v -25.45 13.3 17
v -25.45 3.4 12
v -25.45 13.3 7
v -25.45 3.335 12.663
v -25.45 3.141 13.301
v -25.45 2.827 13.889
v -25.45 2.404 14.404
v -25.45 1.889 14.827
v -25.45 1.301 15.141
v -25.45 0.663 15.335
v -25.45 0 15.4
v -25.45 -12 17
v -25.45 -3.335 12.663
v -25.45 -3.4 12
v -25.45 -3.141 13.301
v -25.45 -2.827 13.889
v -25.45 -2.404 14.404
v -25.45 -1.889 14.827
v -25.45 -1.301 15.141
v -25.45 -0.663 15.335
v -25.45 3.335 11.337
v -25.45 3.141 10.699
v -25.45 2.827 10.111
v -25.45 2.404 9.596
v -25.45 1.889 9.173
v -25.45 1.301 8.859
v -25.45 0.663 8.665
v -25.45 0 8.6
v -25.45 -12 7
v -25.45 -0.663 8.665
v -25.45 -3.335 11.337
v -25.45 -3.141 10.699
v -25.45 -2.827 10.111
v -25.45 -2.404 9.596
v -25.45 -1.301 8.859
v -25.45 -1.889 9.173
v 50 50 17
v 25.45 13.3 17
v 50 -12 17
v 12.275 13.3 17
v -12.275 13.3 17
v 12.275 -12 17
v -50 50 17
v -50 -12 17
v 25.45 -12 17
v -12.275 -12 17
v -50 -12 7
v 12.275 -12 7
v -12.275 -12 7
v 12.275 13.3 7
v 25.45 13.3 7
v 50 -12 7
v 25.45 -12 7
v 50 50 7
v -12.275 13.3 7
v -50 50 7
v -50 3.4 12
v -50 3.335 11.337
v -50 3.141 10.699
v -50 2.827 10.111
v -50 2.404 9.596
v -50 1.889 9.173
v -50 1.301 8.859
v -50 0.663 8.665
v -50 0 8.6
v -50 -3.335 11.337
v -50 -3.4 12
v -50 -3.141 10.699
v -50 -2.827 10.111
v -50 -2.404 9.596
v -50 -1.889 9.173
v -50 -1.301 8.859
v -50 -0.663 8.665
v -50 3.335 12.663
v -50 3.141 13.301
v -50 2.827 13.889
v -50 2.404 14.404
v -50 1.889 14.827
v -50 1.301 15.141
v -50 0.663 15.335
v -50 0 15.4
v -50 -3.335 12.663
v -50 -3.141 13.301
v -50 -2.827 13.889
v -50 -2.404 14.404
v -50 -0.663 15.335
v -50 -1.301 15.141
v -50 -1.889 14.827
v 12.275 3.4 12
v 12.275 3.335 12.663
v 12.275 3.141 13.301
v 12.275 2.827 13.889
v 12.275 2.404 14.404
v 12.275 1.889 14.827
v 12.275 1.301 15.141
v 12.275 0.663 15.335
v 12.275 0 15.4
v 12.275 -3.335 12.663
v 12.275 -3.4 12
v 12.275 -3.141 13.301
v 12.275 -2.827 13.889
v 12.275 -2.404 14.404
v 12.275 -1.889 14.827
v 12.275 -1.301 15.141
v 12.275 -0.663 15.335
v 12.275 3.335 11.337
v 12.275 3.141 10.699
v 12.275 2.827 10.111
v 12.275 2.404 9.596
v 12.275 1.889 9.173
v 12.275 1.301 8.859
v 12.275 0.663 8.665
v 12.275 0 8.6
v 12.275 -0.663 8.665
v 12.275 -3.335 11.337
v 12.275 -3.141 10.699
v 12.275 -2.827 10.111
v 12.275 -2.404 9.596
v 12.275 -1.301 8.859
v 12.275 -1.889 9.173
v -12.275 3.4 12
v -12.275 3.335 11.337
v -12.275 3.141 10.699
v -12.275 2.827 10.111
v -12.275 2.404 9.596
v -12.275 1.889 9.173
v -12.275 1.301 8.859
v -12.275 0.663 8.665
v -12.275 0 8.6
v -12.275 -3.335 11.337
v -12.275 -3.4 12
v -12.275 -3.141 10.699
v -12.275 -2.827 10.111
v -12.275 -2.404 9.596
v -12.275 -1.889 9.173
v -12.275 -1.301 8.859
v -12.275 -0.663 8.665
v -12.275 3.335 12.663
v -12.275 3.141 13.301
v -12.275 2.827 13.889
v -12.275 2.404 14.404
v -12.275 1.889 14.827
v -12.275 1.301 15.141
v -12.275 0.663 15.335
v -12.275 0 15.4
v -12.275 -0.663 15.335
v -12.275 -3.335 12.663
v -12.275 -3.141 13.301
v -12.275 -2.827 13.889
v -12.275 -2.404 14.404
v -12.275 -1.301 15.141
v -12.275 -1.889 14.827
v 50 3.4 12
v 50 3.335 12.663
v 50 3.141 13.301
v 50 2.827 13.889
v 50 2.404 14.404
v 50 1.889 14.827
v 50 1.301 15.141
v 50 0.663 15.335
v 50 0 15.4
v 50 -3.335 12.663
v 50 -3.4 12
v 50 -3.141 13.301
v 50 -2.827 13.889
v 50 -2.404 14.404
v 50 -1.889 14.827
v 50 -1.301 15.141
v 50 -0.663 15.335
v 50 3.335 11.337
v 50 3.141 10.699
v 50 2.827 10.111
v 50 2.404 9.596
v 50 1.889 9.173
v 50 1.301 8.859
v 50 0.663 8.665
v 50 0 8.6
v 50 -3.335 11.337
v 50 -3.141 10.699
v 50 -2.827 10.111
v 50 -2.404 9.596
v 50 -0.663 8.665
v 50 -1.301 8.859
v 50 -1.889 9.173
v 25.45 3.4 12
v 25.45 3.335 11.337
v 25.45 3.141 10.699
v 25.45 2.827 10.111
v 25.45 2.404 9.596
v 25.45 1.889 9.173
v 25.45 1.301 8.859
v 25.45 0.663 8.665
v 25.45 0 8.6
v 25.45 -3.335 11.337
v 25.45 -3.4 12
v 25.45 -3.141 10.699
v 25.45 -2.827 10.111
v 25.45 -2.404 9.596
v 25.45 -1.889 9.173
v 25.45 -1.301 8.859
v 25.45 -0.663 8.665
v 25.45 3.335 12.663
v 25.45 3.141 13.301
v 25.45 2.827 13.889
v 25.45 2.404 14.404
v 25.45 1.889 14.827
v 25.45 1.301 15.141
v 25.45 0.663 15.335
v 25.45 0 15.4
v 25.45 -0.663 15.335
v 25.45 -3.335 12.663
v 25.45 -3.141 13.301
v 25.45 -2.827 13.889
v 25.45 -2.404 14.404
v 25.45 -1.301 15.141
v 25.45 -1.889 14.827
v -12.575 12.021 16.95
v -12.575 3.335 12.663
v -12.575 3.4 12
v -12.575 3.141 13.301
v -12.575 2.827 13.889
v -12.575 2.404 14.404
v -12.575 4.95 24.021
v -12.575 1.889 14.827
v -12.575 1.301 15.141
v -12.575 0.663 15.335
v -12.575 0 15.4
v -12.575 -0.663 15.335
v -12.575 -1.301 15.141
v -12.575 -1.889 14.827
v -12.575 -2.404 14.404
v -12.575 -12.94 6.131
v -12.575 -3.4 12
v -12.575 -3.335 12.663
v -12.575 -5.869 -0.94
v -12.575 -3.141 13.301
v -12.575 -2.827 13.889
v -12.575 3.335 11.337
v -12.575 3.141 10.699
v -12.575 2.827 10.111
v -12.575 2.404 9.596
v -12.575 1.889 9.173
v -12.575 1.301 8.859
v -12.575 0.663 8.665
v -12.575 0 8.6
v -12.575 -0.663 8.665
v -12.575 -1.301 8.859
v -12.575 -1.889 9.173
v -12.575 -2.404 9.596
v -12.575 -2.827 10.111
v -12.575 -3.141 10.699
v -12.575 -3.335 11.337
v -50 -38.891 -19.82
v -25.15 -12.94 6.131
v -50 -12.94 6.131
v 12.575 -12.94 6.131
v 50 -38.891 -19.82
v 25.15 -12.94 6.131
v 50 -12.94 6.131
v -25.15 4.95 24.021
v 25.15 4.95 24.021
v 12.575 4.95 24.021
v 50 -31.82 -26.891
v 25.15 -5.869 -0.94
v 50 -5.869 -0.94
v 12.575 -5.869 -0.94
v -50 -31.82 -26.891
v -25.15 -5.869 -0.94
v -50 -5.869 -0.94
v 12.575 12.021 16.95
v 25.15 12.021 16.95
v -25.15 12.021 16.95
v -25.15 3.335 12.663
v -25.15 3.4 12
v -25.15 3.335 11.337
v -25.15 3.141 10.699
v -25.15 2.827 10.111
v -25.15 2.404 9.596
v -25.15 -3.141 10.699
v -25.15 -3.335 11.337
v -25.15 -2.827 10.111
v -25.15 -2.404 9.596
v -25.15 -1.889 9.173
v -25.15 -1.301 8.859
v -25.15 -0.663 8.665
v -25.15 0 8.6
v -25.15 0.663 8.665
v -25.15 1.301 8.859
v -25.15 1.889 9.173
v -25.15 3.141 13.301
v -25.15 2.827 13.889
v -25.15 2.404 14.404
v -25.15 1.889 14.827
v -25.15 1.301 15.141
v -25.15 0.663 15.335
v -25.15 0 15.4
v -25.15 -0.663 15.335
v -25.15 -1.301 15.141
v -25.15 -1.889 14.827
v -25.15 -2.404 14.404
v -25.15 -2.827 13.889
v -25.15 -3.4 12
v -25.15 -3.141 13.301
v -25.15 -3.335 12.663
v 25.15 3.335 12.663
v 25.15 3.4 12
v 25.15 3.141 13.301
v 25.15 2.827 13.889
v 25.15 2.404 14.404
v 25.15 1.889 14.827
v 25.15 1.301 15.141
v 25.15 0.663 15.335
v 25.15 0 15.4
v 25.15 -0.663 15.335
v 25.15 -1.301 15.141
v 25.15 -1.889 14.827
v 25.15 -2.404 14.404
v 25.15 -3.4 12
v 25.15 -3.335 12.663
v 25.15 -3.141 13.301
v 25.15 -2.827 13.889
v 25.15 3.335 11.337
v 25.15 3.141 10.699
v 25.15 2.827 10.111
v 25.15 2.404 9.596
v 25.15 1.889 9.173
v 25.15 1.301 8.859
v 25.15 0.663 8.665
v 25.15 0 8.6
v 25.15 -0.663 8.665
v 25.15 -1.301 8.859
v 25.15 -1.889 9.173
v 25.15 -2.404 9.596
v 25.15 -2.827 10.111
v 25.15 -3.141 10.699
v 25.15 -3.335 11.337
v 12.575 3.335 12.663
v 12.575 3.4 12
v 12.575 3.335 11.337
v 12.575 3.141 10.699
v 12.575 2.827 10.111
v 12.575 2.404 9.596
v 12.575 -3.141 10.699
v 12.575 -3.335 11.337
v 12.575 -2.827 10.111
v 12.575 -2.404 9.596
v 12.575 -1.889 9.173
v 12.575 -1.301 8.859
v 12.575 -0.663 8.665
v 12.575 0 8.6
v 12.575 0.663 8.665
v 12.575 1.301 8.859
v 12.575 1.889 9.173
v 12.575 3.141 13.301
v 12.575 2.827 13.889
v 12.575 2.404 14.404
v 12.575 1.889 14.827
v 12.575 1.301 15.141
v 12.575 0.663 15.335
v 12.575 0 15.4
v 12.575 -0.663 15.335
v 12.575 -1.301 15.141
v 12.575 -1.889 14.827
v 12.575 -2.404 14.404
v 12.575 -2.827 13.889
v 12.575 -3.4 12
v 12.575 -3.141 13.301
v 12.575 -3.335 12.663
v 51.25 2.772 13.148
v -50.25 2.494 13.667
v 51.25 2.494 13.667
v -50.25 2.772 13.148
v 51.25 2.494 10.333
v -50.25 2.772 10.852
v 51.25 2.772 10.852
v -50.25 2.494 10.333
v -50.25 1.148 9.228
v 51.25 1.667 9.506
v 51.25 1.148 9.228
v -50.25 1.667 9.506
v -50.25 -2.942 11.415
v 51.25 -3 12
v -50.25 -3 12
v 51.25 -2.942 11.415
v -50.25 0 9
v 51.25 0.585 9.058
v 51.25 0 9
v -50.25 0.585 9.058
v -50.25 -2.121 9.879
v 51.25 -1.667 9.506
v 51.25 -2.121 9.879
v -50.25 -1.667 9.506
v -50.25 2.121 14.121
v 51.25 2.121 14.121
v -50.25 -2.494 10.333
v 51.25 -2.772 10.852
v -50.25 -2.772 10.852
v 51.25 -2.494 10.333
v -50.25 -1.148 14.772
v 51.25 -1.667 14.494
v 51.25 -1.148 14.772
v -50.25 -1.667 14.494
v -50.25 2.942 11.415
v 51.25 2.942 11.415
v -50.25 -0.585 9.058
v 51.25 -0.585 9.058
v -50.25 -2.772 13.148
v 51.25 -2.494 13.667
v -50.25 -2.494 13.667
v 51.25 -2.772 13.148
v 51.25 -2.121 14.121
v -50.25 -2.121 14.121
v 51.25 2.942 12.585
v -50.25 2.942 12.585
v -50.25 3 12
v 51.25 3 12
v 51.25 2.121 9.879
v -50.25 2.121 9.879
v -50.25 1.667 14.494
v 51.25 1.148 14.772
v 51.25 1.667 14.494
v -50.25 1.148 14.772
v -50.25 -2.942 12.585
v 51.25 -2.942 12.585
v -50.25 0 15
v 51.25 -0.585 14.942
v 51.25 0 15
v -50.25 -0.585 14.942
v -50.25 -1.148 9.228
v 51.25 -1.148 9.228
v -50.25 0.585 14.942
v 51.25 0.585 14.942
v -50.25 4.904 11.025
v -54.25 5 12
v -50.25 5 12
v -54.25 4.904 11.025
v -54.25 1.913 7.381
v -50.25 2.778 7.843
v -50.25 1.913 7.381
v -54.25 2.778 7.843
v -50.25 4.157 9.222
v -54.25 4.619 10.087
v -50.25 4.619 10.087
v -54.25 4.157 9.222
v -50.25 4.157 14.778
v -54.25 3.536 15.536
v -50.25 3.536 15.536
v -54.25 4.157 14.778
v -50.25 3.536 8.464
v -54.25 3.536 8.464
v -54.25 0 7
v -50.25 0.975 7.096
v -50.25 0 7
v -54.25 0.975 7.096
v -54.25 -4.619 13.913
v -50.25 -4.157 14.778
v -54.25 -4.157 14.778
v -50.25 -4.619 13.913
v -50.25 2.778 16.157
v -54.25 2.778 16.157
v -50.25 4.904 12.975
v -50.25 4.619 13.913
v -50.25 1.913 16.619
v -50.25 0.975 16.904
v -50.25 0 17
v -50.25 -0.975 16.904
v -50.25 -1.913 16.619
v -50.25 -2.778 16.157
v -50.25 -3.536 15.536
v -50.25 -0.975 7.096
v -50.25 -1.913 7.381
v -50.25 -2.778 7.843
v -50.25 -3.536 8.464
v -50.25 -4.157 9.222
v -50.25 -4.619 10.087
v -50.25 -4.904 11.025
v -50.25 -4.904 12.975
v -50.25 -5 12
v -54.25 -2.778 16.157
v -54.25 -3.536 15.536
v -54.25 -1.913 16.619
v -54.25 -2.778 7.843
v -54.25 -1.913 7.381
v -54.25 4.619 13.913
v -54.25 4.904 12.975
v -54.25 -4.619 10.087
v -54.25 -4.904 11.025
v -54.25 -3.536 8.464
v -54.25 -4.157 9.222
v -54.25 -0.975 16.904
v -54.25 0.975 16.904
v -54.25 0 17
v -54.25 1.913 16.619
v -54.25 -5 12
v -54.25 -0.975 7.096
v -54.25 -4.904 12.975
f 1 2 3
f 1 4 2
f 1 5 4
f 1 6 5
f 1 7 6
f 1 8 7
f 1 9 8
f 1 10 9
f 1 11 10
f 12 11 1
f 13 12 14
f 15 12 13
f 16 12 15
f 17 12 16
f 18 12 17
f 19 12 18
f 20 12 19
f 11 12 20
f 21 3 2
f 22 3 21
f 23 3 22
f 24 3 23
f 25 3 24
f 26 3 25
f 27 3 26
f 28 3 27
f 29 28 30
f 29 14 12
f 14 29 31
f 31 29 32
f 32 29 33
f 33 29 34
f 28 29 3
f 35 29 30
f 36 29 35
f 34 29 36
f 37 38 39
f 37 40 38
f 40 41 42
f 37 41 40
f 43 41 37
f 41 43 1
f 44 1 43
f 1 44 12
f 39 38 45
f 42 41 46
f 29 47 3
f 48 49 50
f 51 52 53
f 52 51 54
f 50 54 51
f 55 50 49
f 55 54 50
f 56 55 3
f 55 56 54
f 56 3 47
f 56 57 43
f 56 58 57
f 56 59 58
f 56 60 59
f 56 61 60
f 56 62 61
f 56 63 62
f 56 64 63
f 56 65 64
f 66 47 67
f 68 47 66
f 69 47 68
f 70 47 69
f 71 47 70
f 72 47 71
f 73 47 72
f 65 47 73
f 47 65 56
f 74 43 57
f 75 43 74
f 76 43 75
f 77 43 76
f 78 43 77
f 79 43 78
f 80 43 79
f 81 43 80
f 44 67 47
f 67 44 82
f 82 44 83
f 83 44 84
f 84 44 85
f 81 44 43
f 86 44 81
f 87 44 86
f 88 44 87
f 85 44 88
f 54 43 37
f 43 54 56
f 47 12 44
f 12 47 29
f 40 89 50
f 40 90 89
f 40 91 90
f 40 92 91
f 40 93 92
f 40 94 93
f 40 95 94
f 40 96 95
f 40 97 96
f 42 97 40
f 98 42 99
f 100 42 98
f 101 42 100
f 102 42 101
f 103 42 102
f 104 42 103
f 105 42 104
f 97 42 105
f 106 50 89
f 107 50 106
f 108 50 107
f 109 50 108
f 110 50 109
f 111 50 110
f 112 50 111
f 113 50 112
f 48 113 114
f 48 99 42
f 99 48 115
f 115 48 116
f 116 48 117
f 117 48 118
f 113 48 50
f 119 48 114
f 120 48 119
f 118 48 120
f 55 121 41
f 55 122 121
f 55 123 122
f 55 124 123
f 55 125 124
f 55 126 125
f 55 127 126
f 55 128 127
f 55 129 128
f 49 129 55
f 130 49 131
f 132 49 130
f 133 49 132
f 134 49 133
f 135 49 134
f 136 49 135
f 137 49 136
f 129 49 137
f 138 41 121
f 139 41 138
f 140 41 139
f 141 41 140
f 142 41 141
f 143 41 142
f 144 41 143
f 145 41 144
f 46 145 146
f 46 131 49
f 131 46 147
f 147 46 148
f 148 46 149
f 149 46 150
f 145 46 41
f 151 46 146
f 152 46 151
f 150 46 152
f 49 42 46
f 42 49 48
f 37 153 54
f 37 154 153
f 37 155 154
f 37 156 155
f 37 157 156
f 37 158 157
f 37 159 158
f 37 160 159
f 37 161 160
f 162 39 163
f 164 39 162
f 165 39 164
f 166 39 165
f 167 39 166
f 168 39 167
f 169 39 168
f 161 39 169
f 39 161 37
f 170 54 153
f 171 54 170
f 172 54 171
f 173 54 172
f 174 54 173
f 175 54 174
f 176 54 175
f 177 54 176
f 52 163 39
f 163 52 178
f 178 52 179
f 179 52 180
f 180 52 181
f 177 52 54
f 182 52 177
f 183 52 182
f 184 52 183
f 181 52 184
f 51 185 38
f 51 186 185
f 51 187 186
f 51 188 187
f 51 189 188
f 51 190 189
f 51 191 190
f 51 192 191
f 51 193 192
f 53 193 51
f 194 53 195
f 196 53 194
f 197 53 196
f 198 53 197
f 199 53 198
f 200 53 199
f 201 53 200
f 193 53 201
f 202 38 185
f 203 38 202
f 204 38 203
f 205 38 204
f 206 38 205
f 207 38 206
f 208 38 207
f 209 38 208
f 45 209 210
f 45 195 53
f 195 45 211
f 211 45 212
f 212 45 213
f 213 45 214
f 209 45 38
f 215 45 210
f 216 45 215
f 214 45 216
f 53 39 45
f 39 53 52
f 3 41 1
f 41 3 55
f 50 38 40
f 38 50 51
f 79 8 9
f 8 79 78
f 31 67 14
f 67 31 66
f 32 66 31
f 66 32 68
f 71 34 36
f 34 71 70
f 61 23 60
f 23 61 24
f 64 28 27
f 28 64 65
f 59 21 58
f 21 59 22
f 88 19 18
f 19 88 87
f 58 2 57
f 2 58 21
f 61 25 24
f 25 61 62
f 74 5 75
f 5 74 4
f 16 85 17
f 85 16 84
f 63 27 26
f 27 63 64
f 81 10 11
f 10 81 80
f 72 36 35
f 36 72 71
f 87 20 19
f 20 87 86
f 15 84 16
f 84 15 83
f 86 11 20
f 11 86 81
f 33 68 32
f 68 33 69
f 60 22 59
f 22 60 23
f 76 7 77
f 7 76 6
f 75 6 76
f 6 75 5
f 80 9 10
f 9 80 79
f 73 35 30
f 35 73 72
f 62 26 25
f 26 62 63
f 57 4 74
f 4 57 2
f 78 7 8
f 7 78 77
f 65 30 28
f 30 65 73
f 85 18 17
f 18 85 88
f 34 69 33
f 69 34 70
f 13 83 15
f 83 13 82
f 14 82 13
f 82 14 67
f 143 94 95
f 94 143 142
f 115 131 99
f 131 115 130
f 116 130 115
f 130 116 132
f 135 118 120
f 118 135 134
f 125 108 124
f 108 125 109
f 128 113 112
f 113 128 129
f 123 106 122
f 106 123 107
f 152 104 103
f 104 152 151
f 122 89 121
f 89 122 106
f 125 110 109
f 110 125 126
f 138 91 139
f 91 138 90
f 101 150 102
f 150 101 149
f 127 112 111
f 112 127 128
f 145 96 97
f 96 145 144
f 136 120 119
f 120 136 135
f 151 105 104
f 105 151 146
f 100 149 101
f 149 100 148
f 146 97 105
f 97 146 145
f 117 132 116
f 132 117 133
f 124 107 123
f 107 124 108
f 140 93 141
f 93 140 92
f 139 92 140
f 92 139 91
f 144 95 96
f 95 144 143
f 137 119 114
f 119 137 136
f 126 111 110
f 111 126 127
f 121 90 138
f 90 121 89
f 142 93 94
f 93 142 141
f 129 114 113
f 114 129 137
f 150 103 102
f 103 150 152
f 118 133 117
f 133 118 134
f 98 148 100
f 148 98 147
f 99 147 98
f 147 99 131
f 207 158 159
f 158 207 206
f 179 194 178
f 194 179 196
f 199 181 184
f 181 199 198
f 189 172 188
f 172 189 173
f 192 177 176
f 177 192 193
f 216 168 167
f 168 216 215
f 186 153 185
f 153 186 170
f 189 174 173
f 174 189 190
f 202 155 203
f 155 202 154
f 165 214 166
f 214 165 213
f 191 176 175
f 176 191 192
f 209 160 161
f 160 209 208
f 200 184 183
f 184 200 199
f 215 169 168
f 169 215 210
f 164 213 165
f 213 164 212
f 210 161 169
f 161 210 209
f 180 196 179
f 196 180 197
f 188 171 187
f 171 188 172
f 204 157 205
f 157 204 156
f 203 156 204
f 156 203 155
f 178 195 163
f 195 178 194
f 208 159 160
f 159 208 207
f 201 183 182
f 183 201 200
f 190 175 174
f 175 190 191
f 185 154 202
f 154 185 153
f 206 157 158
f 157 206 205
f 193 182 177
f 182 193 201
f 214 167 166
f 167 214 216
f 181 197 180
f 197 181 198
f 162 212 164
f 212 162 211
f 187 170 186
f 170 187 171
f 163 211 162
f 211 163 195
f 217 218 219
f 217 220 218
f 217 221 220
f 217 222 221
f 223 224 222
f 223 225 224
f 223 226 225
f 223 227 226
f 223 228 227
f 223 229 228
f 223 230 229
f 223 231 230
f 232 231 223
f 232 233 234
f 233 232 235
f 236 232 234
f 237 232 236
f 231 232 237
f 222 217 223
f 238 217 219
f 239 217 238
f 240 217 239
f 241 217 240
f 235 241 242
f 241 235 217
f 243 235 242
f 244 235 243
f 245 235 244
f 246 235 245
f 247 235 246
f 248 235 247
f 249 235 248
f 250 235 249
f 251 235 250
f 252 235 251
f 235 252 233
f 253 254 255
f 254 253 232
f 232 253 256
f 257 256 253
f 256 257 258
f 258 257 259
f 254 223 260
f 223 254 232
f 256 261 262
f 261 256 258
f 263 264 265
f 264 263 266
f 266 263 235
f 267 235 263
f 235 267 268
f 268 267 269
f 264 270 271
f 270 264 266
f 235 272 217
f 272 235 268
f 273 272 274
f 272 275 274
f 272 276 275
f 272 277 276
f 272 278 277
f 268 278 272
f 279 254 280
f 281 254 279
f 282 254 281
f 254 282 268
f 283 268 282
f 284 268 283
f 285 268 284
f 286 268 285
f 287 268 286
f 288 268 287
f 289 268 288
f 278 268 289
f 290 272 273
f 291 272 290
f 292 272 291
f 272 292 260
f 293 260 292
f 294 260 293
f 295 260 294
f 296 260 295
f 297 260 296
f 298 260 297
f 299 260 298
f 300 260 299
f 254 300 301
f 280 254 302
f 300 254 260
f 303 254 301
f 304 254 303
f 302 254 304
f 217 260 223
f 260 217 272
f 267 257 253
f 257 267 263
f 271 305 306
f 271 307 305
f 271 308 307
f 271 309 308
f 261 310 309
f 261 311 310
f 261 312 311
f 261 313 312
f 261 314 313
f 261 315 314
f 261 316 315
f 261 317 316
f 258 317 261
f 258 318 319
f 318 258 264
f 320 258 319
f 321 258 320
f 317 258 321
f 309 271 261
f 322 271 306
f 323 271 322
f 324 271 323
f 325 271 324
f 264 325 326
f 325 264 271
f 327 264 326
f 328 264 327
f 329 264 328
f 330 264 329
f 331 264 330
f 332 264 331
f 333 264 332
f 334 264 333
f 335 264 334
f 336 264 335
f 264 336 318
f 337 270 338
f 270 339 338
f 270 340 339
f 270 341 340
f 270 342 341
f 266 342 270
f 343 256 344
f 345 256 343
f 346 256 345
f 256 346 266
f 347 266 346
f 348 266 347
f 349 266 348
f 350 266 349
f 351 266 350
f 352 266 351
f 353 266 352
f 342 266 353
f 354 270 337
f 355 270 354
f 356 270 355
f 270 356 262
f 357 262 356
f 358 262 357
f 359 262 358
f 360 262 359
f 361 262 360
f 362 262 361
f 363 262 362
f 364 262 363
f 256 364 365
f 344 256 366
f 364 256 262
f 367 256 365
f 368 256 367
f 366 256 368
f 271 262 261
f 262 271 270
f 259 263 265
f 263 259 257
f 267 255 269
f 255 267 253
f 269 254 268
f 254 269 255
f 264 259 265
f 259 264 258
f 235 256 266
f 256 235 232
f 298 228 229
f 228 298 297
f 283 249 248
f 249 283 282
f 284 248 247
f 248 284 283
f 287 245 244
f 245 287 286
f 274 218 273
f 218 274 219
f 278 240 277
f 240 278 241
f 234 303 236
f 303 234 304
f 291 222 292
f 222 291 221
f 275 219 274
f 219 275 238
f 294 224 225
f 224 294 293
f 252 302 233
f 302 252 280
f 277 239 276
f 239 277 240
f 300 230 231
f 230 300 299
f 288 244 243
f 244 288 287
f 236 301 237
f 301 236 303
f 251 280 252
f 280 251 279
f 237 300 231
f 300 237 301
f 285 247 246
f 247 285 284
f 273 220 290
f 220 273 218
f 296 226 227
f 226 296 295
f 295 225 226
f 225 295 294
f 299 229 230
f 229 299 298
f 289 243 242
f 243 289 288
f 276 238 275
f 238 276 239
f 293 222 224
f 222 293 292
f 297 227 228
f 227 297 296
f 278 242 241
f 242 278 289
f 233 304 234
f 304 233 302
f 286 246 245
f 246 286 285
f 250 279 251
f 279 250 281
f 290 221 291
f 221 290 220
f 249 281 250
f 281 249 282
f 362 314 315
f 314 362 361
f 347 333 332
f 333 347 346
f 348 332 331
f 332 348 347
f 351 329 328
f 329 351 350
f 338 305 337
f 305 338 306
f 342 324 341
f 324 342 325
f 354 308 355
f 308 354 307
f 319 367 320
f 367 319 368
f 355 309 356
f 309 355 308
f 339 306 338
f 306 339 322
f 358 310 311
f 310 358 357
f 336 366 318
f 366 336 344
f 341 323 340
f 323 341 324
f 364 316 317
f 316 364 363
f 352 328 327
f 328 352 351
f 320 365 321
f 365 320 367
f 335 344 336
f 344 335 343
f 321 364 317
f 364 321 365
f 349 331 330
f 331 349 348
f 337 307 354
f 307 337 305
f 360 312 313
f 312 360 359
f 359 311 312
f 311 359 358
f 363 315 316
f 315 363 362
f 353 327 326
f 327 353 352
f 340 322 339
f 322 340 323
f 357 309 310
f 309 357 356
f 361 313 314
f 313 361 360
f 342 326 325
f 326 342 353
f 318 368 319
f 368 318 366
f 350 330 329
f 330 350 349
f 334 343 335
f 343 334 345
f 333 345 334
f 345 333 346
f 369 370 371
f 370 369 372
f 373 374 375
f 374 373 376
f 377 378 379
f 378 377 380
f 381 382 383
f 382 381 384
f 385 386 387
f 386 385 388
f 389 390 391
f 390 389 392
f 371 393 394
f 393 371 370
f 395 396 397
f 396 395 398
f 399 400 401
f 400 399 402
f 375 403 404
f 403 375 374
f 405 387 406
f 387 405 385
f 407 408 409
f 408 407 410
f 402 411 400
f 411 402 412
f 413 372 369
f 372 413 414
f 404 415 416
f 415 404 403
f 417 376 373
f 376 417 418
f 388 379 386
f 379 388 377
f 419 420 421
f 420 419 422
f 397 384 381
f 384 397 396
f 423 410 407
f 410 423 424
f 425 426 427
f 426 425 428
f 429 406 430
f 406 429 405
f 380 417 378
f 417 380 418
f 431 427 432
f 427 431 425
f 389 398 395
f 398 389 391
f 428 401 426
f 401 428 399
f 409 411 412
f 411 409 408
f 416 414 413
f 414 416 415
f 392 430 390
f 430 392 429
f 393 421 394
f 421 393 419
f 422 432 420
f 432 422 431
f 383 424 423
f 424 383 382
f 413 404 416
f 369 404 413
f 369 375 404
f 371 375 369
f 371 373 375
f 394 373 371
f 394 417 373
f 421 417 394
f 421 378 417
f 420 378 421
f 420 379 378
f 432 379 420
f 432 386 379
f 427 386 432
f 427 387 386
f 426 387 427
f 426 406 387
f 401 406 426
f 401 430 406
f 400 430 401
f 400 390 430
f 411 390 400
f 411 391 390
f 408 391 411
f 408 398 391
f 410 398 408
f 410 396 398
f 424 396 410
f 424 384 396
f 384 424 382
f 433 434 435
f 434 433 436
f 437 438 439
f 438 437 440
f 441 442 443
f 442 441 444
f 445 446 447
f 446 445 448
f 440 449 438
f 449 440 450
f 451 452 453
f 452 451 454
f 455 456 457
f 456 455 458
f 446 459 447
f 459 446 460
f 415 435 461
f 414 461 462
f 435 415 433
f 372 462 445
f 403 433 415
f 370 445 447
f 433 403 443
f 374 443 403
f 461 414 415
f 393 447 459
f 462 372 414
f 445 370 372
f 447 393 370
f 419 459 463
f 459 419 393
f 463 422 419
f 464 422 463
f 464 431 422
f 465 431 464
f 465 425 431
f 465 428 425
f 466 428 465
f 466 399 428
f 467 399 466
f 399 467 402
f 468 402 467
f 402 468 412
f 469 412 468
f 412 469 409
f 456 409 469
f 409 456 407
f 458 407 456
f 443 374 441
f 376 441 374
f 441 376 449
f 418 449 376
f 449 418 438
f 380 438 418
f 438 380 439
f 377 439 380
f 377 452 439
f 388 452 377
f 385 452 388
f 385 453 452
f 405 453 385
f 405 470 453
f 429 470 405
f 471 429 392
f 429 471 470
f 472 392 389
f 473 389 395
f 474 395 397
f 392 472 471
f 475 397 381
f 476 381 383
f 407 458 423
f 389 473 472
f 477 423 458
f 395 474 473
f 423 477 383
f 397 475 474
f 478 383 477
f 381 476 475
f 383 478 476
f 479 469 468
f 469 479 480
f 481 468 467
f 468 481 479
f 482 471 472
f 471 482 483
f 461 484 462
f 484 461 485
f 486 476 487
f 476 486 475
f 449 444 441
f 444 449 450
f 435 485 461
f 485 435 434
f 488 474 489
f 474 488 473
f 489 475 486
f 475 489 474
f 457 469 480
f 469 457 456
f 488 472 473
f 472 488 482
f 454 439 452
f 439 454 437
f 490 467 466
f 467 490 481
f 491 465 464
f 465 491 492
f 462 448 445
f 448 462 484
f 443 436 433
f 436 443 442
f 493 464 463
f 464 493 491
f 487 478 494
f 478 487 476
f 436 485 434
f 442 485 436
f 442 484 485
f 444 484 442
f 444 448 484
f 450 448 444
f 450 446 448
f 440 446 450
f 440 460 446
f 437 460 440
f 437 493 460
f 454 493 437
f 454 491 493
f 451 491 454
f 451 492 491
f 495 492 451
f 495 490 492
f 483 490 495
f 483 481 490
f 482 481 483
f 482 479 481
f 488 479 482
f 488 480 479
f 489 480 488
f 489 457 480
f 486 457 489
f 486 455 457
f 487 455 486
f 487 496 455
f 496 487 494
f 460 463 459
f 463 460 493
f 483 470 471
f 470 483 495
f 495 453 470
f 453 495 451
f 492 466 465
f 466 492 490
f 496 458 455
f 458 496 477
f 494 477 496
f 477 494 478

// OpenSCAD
$fn = 32;

// ------------------------------------------------------------------------
// Butt hinge: hinge 100 mm, leaf swung 45 deg
// Every part is its own module, assembly() places every instance.
// ------------------------------------------------------------------------

// --- part 1 ---
module hinge_base() {
  difference() {
    union() {
      translate([-50, -12, -5]) cube([24.55, 62, 10]);
      translate([-12.275, -12, -5]) cube([24.55, 62, 10]);
      translate([25.45, -12, -5]) cube([24.55, 62, 10]);
      translate([-50, 13.3, -5]) cube([100, 36.7, 10]);
    }
    translate([-37.725, 0, 0]) rotate([0, 90, 0]) cylinder(h = 26.55, d = 6.8, center = true);
    translate([0, 0, 0]) rotate([0, 90, 0]) cylinder(h = 26.55, d = 6.8, center = true);
    translate([37.725, 0, 0]) rotate([0, 90, 0]) cylinder(h = 26.55, d = 6.8, center = true);
  }
}

// --- part 2 ---
module hinge_mover() {
  difference() {
    union() {
      translate([-25.15, -50, -5]) cube([12.575, 62, 10]);
      translate([12.575, -50, -5]) cube([12.575, 62, 10]);
      translate([-50, -50, -5]) cube([100, 36.7, 10]);
    }
    translate([-18.863, 0, 0]) rotate([0, 90, 0]) cylinder(h = 14.575, d = 6.8, center = true);
    translate([18.863, 0, 0]) rotate([0, 90, 0]) cylinder(h = 14.575, d = 6.8, center = true);
  }
}

// --- part 3 ---
module hinge_pin() {
  rotate([0, 90, 0]) cylinder(h = 102.5, d = 6, center = true);
  translate([-54.25, 0, 0]) rotate([0, 90, 0]) cylinder(h = 4, d = 10);
}

// --- assembly ---
module assembly() {
  color([0.80, 0.24, 0.20]) translate([0, 0, 12]) rotate([0, 0, 0]) hinge_base();
  color([0.20, 0.45, 0.75]) translate([0, 0, 12]) rotate([45, 0, 0]) hinge_mover();
  color([0.25, 0.62, 0.32]) translate([0, 0, 12]) rotate([0, 0, 0]) hinge_pin();
}

assembly();
